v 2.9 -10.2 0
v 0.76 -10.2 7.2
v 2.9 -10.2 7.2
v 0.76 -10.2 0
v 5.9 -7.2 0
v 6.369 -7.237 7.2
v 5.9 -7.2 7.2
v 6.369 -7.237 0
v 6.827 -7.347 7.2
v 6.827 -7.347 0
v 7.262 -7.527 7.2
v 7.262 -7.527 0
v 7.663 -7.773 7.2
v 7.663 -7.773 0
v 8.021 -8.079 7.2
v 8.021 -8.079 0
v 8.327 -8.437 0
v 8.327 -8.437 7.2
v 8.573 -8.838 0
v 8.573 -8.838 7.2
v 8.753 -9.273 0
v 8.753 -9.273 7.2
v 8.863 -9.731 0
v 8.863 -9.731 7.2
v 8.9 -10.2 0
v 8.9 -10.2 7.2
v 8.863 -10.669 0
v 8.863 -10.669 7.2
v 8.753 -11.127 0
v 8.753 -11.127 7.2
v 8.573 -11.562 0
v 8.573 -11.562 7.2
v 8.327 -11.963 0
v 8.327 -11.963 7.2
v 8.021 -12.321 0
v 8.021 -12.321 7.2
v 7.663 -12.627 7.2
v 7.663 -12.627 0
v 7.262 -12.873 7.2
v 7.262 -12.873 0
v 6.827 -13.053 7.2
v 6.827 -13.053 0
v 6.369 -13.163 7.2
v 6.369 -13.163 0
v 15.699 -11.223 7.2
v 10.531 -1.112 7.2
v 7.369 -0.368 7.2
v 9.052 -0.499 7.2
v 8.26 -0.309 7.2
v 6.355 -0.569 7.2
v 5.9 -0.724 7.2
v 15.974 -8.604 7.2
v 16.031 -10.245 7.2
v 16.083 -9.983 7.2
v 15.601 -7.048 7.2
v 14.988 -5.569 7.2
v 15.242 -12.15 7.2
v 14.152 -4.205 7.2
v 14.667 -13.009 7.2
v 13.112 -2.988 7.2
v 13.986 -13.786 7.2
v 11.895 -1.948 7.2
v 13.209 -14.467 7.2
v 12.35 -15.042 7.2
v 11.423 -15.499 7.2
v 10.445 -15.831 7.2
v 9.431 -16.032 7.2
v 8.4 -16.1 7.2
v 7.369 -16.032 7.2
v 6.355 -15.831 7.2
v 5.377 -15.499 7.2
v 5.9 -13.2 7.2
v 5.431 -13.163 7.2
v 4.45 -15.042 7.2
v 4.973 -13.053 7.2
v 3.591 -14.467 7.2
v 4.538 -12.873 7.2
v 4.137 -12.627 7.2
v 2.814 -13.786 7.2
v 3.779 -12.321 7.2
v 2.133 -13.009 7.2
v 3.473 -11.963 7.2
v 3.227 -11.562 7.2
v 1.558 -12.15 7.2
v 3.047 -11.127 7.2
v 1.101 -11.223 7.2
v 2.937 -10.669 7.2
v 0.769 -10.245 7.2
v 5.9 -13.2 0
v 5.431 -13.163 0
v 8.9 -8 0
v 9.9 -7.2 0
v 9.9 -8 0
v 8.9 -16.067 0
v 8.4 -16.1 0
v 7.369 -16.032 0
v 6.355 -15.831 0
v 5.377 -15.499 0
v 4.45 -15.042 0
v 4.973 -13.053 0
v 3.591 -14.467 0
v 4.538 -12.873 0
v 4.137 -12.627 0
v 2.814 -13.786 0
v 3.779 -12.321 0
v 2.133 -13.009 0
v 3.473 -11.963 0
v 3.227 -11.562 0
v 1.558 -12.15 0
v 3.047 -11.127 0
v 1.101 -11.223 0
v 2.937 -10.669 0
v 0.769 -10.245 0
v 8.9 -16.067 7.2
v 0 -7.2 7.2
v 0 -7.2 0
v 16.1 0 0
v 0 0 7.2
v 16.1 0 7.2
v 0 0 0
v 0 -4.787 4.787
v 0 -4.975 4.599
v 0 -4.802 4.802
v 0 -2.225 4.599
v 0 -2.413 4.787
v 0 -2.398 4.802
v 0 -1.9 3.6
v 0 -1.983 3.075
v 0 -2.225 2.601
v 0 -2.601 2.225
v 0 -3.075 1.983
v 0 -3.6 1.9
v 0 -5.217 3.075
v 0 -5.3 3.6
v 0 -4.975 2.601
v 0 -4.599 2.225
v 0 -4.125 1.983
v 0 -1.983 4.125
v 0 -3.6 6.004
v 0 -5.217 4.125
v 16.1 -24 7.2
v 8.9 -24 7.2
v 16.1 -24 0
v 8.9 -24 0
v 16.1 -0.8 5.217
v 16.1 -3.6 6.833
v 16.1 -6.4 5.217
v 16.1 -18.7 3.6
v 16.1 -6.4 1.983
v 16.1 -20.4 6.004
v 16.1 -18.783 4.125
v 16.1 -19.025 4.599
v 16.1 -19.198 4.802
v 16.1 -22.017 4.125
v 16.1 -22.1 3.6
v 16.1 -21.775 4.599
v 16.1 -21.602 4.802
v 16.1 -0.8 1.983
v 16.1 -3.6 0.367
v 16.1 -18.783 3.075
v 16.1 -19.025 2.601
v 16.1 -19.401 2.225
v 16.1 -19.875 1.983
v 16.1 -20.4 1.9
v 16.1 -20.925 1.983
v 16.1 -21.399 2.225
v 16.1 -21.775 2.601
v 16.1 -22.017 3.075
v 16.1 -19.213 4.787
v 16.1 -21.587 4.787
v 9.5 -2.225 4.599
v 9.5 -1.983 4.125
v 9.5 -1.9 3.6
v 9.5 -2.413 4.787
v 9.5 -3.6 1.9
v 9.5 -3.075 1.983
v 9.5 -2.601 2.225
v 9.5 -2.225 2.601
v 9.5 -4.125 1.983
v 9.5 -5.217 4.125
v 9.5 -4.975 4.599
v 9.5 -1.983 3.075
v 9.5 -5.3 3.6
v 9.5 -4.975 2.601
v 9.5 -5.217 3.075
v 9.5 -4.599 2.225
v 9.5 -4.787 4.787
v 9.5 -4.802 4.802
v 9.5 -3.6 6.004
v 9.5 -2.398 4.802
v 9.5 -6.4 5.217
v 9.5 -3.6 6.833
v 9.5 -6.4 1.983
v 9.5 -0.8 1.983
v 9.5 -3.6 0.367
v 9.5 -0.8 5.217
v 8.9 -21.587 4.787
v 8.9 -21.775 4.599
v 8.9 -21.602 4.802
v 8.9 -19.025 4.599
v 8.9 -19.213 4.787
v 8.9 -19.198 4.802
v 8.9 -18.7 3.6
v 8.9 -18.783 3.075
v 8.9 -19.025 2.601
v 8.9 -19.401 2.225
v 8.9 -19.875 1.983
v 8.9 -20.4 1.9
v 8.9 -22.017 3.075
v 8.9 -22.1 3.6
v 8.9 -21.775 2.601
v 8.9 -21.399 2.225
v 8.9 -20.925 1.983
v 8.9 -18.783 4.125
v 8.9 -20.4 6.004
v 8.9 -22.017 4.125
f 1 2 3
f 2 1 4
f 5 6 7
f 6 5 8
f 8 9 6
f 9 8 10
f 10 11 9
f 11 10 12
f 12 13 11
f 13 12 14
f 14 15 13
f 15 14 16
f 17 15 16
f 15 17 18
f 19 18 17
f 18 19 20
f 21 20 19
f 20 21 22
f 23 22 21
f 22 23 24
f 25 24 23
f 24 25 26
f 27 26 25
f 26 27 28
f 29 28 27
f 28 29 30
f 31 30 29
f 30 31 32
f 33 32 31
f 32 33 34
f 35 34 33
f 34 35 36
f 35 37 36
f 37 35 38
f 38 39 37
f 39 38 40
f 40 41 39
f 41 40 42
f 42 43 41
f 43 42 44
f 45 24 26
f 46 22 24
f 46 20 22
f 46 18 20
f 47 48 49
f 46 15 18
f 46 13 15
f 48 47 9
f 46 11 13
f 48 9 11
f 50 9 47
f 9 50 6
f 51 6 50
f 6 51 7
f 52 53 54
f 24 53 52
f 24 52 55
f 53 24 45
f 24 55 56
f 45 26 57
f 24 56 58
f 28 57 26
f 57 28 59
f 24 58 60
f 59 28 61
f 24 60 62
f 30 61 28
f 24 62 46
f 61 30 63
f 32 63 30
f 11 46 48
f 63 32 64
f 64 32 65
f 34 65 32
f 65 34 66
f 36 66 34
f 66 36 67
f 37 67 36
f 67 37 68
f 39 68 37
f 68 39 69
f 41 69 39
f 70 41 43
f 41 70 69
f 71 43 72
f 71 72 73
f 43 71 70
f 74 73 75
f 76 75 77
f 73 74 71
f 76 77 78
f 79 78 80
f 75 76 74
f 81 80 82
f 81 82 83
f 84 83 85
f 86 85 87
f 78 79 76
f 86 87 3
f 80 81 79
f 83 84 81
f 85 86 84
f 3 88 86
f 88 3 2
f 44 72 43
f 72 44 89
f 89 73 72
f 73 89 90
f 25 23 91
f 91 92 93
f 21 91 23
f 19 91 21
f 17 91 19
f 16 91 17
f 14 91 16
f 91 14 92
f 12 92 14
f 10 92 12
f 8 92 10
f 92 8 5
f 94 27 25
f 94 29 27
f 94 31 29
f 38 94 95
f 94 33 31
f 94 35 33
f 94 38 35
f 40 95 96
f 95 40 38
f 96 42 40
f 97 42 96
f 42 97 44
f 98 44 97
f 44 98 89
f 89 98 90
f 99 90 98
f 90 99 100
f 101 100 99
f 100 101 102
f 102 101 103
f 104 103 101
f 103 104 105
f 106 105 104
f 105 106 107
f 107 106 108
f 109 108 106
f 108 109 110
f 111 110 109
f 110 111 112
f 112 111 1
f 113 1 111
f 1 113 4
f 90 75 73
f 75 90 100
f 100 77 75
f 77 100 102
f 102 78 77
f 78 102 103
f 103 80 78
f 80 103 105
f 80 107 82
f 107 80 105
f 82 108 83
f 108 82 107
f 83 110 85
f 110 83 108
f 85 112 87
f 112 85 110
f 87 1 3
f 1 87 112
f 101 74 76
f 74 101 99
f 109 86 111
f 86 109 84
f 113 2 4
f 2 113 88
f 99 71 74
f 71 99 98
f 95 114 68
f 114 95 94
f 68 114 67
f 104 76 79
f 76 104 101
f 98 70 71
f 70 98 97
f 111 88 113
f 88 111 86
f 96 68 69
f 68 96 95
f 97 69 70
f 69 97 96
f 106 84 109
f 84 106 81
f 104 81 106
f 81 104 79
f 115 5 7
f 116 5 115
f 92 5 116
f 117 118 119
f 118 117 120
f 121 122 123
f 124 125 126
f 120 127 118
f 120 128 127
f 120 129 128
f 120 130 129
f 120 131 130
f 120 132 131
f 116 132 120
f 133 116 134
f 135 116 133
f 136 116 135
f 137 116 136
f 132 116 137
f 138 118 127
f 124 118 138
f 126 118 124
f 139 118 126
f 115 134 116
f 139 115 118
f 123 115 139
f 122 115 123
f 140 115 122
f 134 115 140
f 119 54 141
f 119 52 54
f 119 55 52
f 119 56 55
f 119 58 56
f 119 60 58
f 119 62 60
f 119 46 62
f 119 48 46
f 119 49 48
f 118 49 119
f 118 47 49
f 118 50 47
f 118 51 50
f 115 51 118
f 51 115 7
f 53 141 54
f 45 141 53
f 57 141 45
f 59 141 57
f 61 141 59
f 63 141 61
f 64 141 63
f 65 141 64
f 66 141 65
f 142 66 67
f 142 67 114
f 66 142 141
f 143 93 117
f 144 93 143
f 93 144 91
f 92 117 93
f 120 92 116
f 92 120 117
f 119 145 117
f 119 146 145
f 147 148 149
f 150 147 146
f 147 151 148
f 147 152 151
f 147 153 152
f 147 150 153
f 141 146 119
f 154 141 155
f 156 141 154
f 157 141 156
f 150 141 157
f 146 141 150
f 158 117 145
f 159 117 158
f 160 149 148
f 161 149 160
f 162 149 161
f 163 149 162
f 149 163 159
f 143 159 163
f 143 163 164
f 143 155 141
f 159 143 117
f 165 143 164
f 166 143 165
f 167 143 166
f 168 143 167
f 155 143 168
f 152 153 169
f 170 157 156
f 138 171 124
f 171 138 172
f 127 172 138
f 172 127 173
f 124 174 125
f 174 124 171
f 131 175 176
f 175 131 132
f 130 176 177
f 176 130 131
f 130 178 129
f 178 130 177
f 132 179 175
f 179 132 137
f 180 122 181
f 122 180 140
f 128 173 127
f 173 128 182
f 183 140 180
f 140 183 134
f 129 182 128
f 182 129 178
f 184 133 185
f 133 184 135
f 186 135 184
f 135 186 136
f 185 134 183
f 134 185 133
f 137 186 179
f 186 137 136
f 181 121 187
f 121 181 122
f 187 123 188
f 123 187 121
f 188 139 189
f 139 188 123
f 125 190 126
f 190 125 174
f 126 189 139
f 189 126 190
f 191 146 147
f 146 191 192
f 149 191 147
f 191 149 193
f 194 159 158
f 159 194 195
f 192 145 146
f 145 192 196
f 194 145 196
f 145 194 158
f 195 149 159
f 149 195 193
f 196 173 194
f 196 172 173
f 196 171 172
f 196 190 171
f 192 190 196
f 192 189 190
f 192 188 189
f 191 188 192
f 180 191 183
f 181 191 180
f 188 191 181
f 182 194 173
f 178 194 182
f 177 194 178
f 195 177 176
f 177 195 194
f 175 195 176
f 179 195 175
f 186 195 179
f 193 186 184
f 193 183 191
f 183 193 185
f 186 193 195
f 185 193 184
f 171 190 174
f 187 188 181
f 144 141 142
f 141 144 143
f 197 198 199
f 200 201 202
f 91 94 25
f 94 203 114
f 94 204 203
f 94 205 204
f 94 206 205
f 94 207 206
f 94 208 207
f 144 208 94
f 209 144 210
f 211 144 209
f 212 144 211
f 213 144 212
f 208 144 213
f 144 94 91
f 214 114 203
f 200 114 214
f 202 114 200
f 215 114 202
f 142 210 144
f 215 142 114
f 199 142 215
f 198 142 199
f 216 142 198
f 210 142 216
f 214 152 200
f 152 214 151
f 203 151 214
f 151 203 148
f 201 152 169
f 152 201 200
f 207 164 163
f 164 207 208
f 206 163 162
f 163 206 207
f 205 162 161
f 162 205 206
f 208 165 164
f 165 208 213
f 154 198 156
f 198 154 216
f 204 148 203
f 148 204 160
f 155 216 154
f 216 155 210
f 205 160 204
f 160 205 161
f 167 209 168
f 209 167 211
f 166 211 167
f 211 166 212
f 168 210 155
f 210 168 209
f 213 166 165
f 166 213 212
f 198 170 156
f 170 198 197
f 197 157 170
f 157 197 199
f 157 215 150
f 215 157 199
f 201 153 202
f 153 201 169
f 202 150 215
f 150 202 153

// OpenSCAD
// file: lib/parameters.scad
// Parameters shared between modules
Base_th = 2;
Beam_width = 15;
Wiggle = 0.25;
Fat_beam_width = Beam_width + Wiggle;
Beam_length = 400;
Wall_th = 2.5;
Min_beam_width = 12.5;
Max_beam_width = 17.5;
Zip_th = 2;
Zip_h = Zip_th + Max_beam_width - Min_beam_width;
Zip_w = 5.0;
Nema17_cube_width          = 42.43;
Nema17_screw_hole_width    = 43.74; // Opposite corner screws
Nema17_ring_diameter       = 22;
Nema17_cube_height         = 39.36;
Nema17_shaft_height        = 63.65;
Nema17_ring_height         = 2;
Nema17_shaft_radius        = 5/2;
b608_outer_dia = 22.2;
b608_width = 7.05;
b608_bore_r = 4;
b608_vgroove_big_r = b608_outer_dia/2 + 2;
b608_vgroove_small_r = b608_outer_dia/2;
b608_ugroove_big_r = b608_vgroove_big_r;
b608_ugroove_small_r = b608_vgroove_small_r;
Gap_between_sandwich_and_plate = 1.5 + Base_th; // 1.5 mm for wiggle
Motor_bracket_flerp_r = 6;
Motor_bracket_flerp = 14;
Motor_bracket_cw = Nema17_cube_width + 6;
Motor_bracket_att_ang = 50;
Mounting_screw_d = 3.5;
Mounting_screw_head_d = 14;
Spool_outer_wall_th = 4;

// Corner clamp parameters
Cc_l1 = (Fat_beam_width+2*Wall_th)*2*sqrt(3);
Cc_rad_b = 4;
Cc_action_point_from_mid = Cc_l1/sqrt(3)-2*Cc_rad_b-7;
Cc_plastic_length = sqrt(Cc_action_point_from_mid*Cc_action_point_from_mid
                       - (Cc_action_point_from_mid/2)*(Cc_action_point_from_mid/2));
Eyelet_extra_dist = 0.75;
Eyelet_diameter = 4.30;
Move_d_bearings_inwards = -2;

// The distance between the two action points on the mover
Sidelength = Beam_length + 2*Cc_plastic_length;

/////// Gear parameters ////////////
Circular_pitch = 262;
Motor_teeth = 10;
Gear_height = 21.4-3;
Motor_pitch                      = (Motor_teeth*Circular_pitch/360);
Motor_pitch_diametrial           = Motor_teeth/(2*Motor_pitch);
Motor_outer_radius               = Motor_pitch + 1/Motor_pitch_diametrial;
Spool_teeth = 100;
Spool_r = 75;
Spool_height = 8;
Spool_pitch                      = (Spool_teeth*Circular_pitch/360);
Spool_pitch_diametrial           = Spool_teeth/(2*Spool_pitch);
Spool_outer_radius               = Spool_pitch + 1/Spool_pitch_diametrial;
Sep_disc_radius = (161.83+1)/2; // Made to match 255 teeth gt2 pulley + 1
Motor_bracket_depth = Gear_height+1+7+Nema17_ring_height+1+Gap_between_sandwich_and_plate;
Spool_core_flerp0 = 16+3;

/////// Lineroller parameters ////////////
b623_width  = 4;
b623_bore_r = 3/2;
b623_vgroove_big_r = 12/2;
b623_vgroove_small_r = 10/2;
b623_outer_dia = 10;
b623_vgroove_room_to_grow_r = 1.1;
b608_vgroove_room_to_grow_r = 1.1;
b623_flange_dia = 11.5;
b623_flange_room_to_grow_r = 0.5;

Depth_of_roller_base = 18;
Roller_flerp = 6;
Roller_l = 42;
Roller_fl = (Roller_l - Depth_of_roller_base)/2;

Line_roller_wall_th = 5;

Line_roller_ABC_winch_h =  Gap_between_sandwich_and_plate
                           + Sep_disc_radius
                           - Spool_r
                           + Depth_of_roller_base/2
                           + b608_vgroove_small_r;

Shear_line_roller_double_bearings = 20;

Ptfe_r = 2.1;
Roller_base_r = 8;
Screw_h = 2;
Screw_head_h = 2;
M3_screw_head_d = 5.8;
Spool_center_bearing_wall_th = 5;
Corner_clamp_bearings_center_to_center = max(15, (b623_vgroove_big_r + b623_vgroove_room_to_grow_r)*2);
Anchor_bearings_center_to_center = Corner_clamp_bearings_center_to_center + b623_outer_dia;

//// Lineroller anchor parameters /////

Back_bearing_x = b623_vgroove_big_r + 1.5;
Front_bearing_x = -b623_vgroove_big_r - 5;
Move_tower = -12.2;
Lower_bearing_z = 13;
Higher_bearing_z = Lower_bearing_z + Corner_clamp_bearings_center_to_center;

//// Cable Clamp parameters /////
Bit_width = 12;
Cable_r=2.5;

// Belt drive parameters
GT2_belt_width = 6.5;
GT2_gear_height = GT2_belt_width + 2;
GT2_motor_gear_height = 16;
GT2_motor_gear_outer_dia = 16;
GT2_spool_gear_teeth = 255;
GT2_motor_gear_teeth = 20;
Torx_depth = GT2_gear_height/2;
Belt_roller_h = 56;
Belt_thickness = 1.4;

Belt_roller_space_between_walls = 2*b623_width + 0.8;
Belt_roller_wall_th = (Depth_of_roller_base - Belt_roller_space_between_walls)/2+2;
Belt_roller_top_adj_screw_x = Depth_of_roller_base/2-3.7;
Belt_roller_top_adj_screw_y = Belt_roller_space_between_walls/2+2;
Belt_roller_containing_cube_ywidth = Belt_roller_space_between_walls+8.5;
Belt_roller_containing_cube_xwidth = 14;
Belt_roller_insert_h = 18;

Sandwich_ABC_width = 2*(1+Spool_height) + GT2_gear_height;
Sandwich_D_width = 4*(1+Spool_height) + GT2_gear_height;
Spool_core_halve_width = 14.3;
Spool_core_impression_in_spool_cover = 0;
Spool_cover_bottom_th = 1.5;
Spool_cover_shoulder = 2;
Spool_core_cover_adj = Spool_cover_shoulder+Spool_cover_bottom_th-Spool_core_impression_in_spool_cover;
Spool_core_tot_length = 136.458;
Spool_cover_outer_r = Sep_disc_radius + 2;
Gap_between_sep_disc_and_spool_cover = 0.5;

Smooth_rod_length_ABC = Sandwich_ABC_width + 2*(Spool_core_halve_width-Spool_core_impression_in_spool_cover + Spool_cover_bottom_th + Spool_cover_shoulder);
Smooth_rod_length_D = Sandwich_D_width + 2*(Spool_core_halve_width-Spool_core_impression_in_spool_cover + Spool_cover_bottom_th + Spool_cover_shoulder);
echo("Smooth_rod_length_ABC", Smooth_rod_length_ABC);
echo("Smooth_rod_length_D", Smooth_rod_length_D);

Spool_cover_tot_height = Spool_cover_bottom_th+Spool_cover_shoulder+1+Spool_height;
Spool_cover_D_left_tot_height = Spool_cover_shoulder+Spool_cover_bottom_th+1+Spool_height+1+Spool_height;

spd = Spool_height+GT2_gear_height;
// Horizontal_deflector_cube_y_size must be exact this number
// because we want to deflect AB-lines
// 60 degrees on the ceiling unit, and we want to put two
// deflectors in a row and get a distance between bearings
// that maintain the distance d when deflecting 60 degrees
Horizontal_deflector_cube_y_size = (2/sqrt(3))*spd;

Belt_roller_bearing_xpos = Sep_disc_radius + b623_outer_dia/2+Belt_thickness;


// Top plate parameters needed for layout slicer
Yshift_top_plate = -297.8;

Pen_holder_w = 55;
Pen_holder_rail_w = 36;
Pen_holder_bottom_th = 7;
// file: brace_tightener.scad
use <lib/util.scad>

module sector(r1=3, r2=2, sq=[10,10], angle=90){
    rotate_extrude(angle=angle, $fn=4*10)
    translate([r1,0])
    rounded_square(sq, r2, $fn=20);
}

rotate([90,0,0])
brace_tightener(7.2);
module brace_tightener(b){
  shorten = 7;
  difference(){
    union(){
      cube([22.9-shorten, b, b]);
      translate([16.9-shorten, 0, 0])
        cube([b-1, b, 10]);
      translate([12.9-shorten,b,0])
        rotate([90,90,0])
        translate([-b-3,0,0])
        intersection(){
          sector(3, 0, [b, b], 180+90, $fn = 4*12);
          translate([2.0,2.5,-1])
            cylinder(r=7.9, h=12, $fn = 4*12);
        }
    }
    translate([-1,b/2,b/2])
      rotate([0,90,0])
      teardrop(r=3.4/2, h=30, $fn=20);
    translate([9.5,b/2,b/2])
      rotate([0,90,0])
        rotate([0,0,30])
          nut(h=12);
    // to view section cut...
    //translate([-50,5,-50])
    //  cube(100);
  }
}
// main file
use <lib/util.scad>
use <brace_tightener.scad>

rotate([90,0,0])
double_brace_tightener(7.2);
module double_brace_tightener(b){
  shorten = 7;
  difference(){
    union(){
      brace_tightener(b);
      translate([23.1-shorten-b, 0, 8])
        cube([b, b, 24-8]);
    }
    translate([0,b/2,24-b/2])
      rotate([0,90,0])
        teardrop(r=3.4/2, h=30, $fn=20);
  }
}
